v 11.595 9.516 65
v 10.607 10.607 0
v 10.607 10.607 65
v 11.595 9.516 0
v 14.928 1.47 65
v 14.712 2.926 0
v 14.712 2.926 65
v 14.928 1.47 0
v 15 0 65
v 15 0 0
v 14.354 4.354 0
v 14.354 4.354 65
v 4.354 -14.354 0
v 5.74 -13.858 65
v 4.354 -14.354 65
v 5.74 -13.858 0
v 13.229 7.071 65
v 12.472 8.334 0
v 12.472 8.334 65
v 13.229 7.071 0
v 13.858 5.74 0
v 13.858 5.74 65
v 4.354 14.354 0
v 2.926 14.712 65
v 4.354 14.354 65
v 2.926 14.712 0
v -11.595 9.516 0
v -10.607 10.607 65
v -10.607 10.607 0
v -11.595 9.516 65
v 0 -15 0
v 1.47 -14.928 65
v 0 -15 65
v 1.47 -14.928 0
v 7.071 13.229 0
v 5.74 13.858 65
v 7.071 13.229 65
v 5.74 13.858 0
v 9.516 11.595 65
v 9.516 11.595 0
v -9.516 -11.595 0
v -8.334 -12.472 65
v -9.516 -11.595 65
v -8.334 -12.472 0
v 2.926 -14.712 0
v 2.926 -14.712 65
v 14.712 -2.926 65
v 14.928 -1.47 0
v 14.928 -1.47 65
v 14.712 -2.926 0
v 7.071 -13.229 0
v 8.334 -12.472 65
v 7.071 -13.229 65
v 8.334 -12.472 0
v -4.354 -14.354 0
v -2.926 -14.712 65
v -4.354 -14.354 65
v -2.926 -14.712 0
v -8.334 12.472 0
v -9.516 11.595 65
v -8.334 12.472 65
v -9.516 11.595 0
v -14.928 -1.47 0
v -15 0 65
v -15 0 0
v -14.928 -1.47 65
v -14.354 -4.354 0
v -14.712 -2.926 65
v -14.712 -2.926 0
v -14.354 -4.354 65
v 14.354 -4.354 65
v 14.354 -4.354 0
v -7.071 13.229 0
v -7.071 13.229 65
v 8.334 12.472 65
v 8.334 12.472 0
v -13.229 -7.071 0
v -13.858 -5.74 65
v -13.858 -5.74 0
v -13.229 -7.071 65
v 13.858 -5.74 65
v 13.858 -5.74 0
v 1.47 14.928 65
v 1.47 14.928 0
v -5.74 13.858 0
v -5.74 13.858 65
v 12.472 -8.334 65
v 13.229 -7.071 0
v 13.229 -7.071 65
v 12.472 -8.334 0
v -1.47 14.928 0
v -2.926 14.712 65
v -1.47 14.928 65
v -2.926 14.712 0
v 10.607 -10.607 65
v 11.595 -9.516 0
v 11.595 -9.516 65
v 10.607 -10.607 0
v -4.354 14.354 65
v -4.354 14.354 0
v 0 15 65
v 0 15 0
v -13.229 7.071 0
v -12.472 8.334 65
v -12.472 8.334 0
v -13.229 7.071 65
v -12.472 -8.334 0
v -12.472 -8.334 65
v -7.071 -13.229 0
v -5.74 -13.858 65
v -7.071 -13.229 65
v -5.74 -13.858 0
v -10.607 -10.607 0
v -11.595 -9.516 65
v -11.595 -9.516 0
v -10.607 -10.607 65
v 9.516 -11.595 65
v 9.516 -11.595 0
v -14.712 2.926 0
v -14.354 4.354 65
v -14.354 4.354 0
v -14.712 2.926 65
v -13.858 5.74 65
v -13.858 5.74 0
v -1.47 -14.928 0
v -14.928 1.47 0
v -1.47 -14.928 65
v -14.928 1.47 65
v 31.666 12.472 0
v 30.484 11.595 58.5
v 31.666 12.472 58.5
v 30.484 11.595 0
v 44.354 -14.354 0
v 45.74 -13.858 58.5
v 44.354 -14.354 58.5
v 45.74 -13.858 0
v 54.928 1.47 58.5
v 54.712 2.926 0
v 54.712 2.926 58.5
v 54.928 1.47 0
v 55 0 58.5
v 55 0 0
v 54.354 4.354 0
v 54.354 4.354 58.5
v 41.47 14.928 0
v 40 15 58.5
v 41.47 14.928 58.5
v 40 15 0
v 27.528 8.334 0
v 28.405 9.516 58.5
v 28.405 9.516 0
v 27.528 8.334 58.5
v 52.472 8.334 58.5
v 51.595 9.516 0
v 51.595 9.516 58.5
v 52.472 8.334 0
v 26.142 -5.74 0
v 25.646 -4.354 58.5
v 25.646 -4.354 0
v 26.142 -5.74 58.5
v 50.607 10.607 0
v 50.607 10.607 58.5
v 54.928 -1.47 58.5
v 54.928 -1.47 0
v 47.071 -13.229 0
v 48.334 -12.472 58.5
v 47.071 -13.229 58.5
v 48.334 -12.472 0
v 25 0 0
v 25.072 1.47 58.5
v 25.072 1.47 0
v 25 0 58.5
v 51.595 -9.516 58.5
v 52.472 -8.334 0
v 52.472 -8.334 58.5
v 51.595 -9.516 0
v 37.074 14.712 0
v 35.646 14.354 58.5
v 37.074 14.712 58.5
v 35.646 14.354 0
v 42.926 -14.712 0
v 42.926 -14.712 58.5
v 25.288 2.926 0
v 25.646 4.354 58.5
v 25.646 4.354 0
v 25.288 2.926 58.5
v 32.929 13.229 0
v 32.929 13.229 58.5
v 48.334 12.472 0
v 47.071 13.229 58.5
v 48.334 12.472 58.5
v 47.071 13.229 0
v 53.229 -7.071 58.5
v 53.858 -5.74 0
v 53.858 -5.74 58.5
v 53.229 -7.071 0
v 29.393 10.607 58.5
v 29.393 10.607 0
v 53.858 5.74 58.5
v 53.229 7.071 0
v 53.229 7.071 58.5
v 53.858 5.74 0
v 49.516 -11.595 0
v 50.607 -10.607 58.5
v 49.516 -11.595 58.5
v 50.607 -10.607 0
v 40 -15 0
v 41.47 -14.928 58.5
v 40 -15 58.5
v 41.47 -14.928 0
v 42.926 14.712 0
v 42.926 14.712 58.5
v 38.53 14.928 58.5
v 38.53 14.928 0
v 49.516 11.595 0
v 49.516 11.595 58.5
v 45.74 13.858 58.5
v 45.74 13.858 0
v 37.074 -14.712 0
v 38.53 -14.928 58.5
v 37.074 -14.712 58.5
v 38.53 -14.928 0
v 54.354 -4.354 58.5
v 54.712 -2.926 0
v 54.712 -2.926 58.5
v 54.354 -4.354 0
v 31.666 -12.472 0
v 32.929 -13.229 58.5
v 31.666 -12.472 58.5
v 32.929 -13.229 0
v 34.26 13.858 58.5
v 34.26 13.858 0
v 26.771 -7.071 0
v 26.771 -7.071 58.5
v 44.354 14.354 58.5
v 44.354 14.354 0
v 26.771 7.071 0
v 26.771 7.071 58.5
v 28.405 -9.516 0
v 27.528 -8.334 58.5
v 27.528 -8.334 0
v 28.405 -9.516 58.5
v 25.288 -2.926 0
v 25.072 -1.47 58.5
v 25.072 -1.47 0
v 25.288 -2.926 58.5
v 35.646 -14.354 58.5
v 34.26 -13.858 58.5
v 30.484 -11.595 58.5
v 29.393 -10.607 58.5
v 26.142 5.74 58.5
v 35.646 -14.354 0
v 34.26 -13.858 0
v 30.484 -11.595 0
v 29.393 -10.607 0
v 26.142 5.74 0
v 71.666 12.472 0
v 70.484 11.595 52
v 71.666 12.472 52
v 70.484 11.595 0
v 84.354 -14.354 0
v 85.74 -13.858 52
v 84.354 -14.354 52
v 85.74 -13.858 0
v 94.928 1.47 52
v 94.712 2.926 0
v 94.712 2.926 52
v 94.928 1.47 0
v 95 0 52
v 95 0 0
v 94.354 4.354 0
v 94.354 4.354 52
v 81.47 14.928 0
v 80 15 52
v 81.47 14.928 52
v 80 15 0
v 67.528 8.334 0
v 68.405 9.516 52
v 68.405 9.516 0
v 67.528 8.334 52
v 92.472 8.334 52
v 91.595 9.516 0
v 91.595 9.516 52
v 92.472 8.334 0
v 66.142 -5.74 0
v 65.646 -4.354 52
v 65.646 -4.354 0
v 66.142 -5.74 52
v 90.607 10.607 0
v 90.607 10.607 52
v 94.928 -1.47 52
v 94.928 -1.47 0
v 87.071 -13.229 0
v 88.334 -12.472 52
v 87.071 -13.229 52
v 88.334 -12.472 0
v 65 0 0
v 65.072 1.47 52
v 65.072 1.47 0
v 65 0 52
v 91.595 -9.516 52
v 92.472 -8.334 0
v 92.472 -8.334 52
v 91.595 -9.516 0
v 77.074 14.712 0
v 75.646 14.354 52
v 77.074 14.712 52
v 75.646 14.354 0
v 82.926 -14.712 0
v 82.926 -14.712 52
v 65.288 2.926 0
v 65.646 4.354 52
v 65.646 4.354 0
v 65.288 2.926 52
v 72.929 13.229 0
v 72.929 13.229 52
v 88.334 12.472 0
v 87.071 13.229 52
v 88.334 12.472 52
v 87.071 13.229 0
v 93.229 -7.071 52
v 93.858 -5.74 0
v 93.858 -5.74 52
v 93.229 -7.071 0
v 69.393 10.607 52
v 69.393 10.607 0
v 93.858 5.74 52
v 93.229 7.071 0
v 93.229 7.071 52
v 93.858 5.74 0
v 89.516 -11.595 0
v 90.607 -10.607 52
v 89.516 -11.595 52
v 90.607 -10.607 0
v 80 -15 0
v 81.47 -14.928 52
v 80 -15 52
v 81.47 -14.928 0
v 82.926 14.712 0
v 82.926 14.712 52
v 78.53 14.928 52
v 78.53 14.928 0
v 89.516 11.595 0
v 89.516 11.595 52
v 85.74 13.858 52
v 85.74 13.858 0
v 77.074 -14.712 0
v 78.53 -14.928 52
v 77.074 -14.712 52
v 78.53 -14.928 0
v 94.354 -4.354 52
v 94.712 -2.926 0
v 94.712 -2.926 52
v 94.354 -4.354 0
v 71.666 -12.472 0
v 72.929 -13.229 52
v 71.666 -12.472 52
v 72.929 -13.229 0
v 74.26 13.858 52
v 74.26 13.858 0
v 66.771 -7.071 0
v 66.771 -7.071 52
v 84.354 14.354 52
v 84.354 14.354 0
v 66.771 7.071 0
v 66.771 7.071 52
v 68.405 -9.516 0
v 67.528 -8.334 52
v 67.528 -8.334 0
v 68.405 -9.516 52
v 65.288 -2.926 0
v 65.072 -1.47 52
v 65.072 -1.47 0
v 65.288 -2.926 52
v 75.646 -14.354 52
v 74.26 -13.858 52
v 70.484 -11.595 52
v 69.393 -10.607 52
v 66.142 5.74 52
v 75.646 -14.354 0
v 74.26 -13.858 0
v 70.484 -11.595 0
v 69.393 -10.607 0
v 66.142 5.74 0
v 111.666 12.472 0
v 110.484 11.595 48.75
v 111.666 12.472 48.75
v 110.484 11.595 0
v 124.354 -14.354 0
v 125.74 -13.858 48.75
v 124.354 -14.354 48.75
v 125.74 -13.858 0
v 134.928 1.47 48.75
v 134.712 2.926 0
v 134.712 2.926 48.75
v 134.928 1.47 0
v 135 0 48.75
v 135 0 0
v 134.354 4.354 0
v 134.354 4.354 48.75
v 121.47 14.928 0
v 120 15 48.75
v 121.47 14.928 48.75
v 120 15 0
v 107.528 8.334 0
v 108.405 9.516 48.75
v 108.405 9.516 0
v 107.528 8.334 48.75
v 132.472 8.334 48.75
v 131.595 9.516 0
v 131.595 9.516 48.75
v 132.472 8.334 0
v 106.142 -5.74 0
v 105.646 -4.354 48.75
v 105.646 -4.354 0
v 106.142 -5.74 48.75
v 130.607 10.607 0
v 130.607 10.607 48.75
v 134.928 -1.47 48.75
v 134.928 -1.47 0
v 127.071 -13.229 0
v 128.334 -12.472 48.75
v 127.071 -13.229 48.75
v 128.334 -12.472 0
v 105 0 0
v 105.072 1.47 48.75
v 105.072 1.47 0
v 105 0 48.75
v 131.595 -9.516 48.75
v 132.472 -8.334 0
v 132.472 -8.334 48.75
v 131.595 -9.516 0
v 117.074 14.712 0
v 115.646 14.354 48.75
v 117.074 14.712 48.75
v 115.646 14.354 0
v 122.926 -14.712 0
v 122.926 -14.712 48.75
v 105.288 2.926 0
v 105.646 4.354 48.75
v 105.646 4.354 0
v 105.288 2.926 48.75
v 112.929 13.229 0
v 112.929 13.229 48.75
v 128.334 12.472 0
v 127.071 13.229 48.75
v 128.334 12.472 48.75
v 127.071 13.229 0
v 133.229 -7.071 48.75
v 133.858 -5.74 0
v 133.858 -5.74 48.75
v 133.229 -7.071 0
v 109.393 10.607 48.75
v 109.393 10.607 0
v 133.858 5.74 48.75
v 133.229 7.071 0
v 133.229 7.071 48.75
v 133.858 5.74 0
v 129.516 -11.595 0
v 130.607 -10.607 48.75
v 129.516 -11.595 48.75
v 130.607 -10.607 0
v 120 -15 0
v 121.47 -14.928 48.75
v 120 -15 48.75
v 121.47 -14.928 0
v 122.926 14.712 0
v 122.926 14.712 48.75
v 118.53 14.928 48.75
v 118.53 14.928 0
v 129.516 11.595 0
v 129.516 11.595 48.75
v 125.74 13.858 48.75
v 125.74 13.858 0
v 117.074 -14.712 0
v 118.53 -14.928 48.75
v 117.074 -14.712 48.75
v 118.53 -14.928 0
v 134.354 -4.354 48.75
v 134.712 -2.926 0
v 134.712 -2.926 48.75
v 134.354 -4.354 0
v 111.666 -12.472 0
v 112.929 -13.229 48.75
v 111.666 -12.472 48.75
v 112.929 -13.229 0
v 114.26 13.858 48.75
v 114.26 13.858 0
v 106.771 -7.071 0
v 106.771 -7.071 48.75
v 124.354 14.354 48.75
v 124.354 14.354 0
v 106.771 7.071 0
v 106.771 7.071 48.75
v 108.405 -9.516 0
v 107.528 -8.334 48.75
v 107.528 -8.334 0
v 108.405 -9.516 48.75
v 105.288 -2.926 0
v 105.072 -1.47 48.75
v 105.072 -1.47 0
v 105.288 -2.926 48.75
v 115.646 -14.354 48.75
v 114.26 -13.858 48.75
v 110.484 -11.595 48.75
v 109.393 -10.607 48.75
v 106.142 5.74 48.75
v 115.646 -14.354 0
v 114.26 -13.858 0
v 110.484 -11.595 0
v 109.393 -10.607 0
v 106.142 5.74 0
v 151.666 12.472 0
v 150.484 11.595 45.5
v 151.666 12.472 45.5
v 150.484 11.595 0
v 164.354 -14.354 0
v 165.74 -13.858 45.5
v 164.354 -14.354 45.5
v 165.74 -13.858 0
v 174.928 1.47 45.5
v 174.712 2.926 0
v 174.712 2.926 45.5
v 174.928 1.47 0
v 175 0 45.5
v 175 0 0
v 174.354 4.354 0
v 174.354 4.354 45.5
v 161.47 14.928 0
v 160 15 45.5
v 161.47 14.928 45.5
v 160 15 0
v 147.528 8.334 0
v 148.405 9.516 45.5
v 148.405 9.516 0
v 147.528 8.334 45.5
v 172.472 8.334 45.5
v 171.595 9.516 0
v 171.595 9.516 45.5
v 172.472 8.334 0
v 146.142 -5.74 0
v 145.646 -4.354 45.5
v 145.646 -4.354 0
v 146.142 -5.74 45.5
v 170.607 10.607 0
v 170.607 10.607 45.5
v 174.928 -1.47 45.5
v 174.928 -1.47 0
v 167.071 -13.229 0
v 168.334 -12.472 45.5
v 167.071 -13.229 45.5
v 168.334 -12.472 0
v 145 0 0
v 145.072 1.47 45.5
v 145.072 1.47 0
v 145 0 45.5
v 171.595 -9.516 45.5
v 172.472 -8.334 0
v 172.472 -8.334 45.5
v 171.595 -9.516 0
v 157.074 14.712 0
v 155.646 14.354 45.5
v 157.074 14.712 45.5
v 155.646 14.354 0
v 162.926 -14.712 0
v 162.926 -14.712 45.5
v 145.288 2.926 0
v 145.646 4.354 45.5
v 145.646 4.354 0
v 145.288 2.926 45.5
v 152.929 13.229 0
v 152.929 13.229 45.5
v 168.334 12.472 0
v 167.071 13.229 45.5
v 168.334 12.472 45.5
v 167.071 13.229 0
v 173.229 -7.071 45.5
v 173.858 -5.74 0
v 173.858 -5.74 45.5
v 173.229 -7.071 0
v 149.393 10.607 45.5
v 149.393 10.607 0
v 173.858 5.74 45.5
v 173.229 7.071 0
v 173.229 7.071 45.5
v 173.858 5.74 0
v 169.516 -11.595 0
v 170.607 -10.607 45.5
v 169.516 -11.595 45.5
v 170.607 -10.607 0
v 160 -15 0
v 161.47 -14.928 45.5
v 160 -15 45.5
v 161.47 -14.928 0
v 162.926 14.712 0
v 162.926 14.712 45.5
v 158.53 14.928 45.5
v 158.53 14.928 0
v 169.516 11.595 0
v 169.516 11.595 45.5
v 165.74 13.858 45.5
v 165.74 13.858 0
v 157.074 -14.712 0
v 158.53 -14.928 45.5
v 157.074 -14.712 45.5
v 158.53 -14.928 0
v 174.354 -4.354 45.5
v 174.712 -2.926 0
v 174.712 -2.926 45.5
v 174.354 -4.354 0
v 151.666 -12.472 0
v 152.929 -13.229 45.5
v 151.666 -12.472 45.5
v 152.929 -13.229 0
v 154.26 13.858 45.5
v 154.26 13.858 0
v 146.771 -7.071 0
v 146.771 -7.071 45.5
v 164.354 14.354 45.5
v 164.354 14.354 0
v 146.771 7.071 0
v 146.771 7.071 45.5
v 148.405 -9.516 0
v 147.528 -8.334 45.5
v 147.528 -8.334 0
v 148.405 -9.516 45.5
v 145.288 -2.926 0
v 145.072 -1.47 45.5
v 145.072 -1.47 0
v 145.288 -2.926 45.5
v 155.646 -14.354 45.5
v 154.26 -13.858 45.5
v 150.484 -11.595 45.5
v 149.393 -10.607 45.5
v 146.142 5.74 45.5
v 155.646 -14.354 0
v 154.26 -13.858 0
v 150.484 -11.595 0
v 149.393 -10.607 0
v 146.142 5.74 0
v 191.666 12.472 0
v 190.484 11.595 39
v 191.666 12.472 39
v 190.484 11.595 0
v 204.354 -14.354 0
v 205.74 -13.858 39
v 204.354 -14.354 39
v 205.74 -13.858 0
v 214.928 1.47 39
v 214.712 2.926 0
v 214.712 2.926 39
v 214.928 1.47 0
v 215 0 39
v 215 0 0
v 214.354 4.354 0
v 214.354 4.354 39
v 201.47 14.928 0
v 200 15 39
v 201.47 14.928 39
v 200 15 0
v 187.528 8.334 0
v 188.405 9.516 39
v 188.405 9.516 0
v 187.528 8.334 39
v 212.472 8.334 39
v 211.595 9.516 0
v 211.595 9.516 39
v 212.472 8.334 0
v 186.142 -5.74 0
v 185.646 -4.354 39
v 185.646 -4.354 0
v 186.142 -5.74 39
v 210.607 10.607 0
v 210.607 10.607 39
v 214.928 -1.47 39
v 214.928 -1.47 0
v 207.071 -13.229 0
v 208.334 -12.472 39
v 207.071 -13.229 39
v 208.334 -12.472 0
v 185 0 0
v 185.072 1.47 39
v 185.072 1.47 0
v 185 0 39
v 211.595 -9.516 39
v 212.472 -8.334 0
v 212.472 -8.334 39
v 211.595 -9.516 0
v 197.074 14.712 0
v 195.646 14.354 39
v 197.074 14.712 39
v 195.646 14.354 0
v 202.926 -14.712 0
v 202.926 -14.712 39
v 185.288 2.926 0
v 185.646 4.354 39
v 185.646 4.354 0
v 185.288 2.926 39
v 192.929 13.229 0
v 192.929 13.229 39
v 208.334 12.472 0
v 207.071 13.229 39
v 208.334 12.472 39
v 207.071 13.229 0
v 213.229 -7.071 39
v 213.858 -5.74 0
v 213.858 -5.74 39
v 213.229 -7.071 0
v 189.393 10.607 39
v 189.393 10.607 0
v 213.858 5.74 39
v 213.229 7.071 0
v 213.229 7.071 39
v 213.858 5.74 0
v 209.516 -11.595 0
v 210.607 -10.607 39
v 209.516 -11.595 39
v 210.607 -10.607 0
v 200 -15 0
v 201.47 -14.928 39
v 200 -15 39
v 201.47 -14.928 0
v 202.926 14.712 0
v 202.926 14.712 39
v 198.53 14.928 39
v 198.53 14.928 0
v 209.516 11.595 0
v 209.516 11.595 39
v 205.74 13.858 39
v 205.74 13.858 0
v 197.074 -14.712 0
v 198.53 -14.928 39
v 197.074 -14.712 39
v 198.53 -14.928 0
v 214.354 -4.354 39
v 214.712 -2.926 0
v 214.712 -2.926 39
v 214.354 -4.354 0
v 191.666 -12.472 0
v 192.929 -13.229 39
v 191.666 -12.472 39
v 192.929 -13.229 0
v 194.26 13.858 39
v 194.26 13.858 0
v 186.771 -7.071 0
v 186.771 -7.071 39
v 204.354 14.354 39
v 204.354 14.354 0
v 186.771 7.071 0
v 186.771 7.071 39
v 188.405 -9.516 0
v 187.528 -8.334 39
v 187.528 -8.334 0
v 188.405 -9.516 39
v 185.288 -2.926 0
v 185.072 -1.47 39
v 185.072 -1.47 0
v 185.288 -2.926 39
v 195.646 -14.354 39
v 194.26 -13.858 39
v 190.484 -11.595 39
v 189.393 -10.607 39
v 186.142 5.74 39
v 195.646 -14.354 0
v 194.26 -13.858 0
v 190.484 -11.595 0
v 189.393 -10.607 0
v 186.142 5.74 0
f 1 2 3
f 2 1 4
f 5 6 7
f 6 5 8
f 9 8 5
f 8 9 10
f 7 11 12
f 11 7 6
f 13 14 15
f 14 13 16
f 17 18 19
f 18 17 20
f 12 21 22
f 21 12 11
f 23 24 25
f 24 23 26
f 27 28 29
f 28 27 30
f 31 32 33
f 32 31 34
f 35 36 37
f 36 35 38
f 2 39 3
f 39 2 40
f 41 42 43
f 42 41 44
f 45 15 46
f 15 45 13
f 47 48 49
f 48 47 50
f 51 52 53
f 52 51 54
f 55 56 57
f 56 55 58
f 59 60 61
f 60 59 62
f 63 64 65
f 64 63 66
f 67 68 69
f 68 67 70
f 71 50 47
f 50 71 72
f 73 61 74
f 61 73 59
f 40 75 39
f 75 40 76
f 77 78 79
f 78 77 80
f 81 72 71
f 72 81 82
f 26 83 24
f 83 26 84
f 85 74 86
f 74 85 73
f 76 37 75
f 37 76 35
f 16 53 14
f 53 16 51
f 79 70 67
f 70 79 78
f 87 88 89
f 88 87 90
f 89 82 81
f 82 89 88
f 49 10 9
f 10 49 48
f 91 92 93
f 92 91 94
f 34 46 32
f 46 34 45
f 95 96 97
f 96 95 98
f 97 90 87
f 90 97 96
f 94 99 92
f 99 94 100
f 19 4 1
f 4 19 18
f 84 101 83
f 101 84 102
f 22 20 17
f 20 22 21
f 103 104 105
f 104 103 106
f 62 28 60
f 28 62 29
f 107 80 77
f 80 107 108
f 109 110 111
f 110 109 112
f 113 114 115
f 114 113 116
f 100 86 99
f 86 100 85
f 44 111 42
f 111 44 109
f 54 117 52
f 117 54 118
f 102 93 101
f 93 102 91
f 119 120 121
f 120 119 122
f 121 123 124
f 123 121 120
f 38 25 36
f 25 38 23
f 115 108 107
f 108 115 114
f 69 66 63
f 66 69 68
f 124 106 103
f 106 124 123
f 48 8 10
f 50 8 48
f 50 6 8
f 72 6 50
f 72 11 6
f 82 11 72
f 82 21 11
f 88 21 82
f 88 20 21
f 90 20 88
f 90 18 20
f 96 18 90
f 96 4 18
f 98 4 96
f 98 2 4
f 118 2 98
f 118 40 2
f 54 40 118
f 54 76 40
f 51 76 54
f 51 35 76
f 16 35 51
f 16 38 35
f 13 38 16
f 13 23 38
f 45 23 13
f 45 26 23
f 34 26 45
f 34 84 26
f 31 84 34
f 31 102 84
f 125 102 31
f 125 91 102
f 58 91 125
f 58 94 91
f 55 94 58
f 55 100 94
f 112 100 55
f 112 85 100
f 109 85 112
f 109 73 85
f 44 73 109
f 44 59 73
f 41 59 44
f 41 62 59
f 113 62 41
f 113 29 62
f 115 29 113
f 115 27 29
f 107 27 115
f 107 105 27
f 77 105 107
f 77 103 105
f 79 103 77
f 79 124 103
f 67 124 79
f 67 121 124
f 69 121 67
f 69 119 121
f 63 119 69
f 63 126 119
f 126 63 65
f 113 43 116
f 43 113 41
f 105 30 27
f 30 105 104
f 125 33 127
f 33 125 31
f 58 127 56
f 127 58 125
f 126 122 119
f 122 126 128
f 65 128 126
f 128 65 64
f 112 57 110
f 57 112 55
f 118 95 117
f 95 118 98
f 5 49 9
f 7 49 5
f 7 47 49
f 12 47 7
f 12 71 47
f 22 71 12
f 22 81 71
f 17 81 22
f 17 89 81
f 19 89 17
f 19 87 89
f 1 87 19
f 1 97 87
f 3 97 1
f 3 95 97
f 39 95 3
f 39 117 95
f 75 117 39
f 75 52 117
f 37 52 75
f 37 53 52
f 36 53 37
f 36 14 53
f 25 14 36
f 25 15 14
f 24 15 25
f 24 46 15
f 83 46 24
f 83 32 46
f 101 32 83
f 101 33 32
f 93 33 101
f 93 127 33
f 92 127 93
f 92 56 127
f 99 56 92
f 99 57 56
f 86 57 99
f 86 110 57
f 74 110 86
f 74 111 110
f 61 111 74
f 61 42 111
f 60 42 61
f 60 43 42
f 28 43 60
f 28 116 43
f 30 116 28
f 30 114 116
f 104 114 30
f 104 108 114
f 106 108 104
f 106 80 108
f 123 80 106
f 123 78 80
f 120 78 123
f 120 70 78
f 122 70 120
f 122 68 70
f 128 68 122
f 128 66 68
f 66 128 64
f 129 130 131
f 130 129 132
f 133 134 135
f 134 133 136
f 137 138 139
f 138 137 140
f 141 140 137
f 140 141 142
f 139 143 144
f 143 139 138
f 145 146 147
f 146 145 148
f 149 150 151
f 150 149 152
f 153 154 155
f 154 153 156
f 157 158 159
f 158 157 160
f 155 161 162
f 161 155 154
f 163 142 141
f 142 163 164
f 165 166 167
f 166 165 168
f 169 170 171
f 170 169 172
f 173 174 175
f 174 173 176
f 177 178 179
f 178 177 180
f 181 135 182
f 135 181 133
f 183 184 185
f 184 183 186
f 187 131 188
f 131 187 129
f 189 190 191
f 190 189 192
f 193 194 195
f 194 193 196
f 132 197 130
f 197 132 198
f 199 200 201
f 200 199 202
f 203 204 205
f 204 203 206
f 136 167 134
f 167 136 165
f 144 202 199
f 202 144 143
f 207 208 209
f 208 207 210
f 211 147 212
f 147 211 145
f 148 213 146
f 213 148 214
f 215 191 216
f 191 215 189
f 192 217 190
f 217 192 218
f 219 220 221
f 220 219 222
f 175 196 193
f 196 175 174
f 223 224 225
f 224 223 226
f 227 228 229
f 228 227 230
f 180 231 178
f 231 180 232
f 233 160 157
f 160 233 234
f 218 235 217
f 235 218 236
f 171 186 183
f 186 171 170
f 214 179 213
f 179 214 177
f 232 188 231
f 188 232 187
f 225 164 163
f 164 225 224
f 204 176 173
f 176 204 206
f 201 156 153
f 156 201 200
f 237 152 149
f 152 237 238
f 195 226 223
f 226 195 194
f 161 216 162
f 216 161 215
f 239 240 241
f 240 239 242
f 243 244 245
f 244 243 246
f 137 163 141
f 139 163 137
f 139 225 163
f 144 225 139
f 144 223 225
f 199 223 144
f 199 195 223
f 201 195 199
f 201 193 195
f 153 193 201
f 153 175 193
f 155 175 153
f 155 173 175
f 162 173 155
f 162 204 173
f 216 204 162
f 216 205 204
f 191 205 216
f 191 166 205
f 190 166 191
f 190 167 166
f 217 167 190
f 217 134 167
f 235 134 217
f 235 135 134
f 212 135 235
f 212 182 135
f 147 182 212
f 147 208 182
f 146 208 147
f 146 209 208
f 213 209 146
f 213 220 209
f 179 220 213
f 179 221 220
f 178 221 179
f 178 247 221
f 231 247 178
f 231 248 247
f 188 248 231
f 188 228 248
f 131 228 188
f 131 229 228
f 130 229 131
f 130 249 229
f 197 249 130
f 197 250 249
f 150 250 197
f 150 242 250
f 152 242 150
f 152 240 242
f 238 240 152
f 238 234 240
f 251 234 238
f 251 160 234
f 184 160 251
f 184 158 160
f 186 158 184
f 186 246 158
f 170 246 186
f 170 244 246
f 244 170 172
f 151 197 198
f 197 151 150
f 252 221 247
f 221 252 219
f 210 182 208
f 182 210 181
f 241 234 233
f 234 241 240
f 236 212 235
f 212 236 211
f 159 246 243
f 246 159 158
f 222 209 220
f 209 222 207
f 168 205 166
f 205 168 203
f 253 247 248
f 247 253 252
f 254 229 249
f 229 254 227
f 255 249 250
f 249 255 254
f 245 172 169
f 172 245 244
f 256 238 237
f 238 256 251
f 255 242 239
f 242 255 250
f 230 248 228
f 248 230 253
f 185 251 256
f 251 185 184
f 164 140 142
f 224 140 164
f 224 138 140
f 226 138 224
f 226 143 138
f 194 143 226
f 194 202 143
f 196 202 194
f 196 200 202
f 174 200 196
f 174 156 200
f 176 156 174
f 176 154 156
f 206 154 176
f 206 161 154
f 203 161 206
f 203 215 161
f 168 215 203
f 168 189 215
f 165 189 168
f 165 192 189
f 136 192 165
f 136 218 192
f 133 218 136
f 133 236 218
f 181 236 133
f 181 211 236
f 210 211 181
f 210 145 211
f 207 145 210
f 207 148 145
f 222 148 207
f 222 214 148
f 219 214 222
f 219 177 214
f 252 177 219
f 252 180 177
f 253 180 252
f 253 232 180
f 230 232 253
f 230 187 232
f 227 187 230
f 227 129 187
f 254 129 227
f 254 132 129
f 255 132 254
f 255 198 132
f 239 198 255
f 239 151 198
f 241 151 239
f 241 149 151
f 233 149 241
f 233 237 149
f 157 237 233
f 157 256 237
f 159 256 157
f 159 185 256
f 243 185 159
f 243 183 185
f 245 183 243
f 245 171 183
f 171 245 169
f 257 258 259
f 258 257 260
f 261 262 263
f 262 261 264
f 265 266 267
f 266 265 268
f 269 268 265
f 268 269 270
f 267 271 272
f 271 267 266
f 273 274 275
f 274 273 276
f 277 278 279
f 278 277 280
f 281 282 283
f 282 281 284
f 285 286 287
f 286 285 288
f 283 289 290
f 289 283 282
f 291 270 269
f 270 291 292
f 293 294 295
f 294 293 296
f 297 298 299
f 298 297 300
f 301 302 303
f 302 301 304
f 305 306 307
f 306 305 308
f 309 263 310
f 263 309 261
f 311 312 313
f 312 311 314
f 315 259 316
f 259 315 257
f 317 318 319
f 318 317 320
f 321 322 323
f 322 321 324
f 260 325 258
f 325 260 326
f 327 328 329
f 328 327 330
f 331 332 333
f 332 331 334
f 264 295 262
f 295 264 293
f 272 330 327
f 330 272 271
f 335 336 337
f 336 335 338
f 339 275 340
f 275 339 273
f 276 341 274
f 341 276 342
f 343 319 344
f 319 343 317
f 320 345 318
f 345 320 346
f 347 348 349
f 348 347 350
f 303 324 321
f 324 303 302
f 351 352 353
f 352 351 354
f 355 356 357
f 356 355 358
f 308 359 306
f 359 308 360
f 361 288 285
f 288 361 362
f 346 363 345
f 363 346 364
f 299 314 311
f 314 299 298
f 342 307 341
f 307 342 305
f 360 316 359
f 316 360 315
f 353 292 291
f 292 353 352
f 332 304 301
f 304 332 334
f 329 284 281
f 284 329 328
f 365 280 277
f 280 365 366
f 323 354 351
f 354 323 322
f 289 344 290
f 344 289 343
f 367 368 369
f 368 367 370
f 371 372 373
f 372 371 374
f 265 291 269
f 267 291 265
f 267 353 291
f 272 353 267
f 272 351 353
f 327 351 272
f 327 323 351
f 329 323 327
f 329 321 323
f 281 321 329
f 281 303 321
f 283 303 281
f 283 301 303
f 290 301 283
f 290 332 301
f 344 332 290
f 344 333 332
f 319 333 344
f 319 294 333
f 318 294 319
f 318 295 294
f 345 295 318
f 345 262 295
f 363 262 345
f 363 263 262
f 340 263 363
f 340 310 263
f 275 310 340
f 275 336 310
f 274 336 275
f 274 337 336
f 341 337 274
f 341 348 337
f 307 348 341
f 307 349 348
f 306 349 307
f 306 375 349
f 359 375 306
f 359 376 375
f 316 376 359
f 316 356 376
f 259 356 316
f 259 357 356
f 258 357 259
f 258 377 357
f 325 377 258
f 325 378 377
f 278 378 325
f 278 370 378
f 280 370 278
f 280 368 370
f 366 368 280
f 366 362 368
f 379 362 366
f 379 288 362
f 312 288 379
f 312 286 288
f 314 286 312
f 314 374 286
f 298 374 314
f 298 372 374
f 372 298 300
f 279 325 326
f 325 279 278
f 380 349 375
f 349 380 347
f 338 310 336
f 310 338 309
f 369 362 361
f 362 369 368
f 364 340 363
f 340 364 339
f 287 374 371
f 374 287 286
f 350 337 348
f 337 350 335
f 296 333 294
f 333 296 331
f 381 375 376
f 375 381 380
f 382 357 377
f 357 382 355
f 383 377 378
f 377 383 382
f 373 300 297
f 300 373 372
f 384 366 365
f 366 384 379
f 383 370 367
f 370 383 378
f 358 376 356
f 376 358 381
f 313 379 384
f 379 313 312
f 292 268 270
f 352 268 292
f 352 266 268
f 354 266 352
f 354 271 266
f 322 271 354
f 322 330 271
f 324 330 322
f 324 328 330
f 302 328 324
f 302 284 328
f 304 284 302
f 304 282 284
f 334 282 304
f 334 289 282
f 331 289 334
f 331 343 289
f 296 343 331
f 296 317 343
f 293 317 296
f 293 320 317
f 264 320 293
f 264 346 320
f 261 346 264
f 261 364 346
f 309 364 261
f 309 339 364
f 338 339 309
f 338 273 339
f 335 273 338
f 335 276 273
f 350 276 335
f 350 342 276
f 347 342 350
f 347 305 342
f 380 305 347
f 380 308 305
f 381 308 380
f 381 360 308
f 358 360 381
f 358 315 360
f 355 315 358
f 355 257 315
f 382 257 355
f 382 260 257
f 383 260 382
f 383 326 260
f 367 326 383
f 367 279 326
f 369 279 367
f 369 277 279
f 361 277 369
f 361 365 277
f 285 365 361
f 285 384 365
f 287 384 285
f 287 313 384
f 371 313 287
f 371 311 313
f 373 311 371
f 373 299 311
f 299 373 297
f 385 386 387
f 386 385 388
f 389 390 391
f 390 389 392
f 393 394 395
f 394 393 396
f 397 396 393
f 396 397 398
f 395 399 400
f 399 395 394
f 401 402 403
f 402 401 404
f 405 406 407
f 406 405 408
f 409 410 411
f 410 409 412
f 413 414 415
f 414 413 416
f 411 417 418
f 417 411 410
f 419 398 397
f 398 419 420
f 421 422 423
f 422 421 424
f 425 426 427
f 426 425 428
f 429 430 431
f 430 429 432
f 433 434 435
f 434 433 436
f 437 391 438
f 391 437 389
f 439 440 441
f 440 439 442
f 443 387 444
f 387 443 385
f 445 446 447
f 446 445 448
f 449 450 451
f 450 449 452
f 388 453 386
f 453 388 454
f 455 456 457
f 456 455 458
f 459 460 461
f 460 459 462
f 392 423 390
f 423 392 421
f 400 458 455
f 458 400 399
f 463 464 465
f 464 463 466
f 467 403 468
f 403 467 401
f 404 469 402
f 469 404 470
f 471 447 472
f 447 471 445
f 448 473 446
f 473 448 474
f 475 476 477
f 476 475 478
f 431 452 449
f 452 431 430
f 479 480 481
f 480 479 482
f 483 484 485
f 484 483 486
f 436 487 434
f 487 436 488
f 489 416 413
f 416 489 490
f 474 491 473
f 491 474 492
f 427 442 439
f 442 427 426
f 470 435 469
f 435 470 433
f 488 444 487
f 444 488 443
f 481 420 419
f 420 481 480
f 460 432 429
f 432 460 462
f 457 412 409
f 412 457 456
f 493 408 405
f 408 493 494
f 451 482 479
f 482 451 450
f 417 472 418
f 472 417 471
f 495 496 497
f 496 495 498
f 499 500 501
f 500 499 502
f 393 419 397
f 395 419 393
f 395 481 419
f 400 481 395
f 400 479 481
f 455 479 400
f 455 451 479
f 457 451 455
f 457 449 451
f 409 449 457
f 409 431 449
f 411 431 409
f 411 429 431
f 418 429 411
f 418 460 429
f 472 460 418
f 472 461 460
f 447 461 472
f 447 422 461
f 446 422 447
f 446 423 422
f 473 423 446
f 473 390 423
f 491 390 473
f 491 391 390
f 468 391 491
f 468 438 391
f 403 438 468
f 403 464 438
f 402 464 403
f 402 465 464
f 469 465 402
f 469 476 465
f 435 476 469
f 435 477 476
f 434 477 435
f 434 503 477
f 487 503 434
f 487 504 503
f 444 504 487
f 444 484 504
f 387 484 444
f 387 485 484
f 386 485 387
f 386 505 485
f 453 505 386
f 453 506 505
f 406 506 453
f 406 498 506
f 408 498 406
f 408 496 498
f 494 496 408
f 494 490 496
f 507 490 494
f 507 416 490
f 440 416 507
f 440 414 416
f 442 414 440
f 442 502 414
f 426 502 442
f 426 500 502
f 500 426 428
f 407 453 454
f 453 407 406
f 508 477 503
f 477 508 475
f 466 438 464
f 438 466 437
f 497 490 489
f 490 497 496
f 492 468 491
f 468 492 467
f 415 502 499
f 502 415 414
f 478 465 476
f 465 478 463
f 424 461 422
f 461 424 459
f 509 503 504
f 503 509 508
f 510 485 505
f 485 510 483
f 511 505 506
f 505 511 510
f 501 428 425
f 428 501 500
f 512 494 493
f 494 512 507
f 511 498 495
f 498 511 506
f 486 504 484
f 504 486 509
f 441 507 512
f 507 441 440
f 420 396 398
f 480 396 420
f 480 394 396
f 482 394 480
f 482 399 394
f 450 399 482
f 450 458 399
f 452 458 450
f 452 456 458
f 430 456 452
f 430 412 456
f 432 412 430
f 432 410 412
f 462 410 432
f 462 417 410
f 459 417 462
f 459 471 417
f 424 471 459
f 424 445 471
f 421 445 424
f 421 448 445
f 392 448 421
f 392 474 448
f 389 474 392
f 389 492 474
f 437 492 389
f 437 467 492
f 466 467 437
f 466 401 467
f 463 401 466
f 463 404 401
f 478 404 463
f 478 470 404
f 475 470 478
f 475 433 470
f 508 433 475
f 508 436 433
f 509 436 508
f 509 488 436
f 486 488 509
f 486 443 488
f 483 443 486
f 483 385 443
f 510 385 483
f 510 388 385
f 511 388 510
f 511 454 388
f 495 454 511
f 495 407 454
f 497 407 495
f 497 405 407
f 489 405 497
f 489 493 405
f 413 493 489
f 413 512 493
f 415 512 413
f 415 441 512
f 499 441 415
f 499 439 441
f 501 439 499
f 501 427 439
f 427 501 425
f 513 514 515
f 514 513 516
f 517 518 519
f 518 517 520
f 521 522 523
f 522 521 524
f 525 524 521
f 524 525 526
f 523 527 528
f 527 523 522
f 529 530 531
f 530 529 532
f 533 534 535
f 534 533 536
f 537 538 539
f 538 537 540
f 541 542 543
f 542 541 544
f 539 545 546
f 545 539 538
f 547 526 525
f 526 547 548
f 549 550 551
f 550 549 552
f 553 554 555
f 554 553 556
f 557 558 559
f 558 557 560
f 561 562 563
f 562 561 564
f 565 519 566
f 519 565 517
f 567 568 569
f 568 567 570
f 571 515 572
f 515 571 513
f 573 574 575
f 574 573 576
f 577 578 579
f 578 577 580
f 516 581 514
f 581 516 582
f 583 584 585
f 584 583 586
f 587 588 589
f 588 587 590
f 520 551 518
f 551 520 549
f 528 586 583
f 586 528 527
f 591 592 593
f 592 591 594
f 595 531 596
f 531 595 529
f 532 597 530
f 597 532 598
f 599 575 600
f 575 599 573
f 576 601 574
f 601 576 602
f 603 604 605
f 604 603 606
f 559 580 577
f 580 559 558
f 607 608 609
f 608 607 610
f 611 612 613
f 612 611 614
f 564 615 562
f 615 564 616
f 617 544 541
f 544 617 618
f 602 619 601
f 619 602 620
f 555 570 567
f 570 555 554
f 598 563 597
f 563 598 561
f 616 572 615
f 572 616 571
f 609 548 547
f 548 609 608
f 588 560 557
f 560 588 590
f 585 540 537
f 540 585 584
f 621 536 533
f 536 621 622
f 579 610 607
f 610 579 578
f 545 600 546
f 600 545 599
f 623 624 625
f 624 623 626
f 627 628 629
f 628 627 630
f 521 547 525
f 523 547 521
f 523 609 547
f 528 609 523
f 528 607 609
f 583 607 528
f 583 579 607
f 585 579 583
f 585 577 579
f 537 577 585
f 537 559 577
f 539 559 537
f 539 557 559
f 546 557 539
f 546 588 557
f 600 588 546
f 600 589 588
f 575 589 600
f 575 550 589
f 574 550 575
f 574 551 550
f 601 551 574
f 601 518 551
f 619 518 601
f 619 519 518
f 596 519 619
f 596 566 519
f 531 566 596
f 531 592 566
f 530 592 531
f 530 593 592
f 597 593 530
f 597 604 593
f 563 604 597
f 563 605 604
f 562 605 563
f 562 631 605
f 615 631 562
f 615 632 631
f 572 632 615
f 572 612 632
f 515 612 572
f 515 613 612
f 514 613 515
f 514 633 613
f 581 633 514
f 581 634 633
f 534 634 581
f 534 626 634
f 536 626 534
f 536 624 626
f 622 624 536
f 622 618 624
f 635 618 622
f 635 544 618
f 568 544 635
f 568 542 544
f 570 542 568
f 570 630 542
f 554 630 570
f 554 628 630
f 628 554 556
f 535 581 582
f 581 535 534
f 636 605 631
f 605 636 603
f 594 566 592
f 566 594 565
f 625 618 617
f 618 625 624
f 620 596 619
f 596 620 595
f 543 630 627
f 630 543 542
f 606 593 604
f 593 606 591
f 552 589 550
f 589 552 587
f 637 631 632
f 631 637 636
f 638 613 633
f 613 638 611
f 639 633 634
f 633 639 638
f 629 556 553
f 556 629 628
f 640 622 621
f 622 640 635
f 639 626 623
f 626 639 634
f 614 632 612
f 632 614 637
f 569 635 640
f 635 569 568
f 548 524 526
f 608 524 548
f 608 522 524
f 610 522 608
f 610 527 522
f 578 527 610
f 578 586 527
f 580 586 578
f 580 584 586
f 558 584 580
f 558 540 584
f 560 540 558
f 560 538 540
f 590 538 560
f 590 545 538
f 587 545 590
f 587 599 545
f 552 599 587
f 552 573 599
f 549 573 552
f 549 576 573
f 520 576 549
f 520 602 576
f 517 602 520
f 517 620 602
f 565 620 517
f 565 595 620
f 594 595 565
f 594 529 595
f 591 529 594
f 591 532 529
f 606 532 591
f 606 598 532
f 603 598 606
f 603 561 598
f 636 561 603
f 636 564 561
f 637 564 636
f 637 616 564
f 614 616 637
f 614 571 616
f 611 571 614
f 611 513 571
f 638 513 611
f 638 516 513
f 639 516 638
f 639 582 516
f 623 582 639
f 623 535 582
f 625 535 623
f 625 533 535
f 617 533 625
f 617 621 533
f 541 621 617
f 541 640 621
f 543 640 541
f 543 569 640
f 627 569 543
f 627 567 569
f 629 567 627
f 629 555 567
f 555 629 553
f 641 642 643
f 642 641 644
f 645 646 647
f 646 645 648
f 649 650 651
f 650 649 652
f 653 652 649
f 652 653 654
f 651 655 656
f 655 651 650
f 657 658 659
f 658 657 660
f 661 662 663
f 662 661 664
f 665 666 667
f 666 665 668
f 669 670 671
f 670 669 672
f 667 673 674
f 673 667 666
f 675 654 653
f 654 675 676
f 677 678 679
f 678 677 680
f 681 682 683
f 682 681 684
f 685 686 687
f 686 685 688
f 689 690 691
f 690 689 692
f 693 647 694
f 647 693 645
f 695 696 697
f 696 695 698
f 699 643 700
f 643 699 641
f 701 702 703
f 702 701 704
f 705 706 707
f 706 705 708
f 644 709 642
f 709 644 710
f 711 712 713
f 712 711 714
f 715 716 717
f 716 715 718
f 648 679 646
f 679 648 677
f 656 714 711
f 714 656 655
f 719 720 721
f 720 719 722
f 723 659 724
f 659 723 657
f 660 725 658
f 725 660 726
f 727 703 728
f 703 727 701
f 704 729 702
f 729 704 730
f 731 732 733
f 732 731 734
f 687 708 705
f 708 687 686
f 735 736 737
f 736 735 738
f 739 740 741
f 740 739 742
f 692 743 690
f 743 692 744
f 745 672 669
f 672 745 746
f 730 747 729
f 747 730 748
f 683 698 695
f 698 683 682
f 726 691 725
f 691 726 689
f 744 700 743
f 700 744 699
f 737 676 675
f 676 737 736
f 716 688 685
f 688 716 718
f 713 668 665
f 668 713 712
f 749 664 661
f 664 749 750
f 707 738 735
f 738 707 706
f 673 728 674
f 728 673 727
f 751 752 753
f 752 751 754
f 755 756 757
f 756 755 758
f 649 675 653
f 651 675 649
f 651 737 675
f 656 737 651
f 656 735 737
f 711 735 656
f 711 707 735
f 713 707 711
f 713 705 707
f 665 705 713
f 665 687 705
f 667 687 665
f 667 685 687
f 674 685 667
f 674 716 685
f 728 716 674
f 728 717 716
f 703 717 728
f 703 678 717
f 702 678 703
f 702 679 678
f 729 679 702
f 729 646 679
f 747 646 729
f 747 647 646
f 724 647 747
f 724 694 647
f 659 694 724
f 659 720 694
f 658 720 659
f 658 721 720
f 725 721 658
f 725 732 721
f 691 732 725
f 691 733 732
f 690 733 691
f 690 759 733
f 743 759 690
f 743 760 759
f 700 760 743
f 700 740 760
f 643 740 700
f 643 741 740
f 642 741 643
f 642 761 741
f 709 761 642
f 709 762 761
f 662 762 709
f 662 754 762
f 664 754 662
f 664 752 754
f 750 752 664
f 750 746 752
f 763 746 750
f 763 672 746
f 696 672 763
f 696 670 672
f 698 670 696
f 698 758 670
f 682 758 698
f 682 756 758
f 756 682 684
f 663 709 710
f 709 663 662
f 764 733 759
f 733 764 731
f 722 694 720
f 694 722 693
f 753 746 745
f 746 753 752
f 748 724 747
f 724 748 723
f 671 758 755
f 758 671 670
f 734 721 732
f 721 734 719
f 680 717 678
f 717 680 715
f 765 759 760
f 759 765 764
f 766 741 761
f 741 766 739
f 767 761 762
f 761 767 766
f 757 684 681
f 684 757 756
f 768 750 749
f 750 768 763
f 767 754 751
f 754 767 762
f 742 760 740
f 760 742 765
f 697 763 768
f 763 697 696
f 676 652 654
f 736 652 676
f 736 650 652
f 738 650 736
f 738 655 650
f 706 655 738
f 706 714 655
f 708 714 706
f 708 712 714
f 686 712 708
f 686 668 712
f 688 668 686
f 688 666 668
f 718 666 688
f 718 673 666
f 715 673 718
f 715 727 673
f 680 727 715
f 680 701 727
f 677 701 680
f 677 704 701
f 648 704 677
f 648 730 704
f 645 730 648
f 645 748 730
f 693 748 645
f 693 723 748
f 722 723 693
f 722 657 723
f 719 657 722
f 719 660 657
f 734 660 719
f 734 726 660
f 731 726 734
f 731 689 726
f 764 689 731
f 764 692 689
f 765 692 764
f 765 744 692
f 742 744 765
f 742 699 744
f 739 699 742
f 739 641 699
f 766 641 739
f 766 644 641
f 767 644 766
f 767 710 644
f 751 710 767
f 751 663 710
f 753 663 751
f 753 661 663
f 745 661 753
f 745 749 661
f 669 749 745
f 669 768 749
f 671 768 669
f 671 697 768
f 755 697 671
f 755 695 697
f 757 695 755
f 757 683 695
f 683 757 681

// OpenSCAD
// Versus Chess — Layer 1: Parametric Sizing Rig
//
// Forking for your own table? Change table_square_mm and base_diameter_mm
// below (see docs/PROJECT-SPEC.md for the 40-45% clearance rule these come
// from) and every role blank re-derives automatically. Nothing below the
// parameters block should need to change for a different table.

table_square_mm  = 70;   // this table's measured square width
base_diameter_mm = 30;   // uniform across all roles — see docs/PROJECT-SPEC.md
king_height_mm   = 65;   // the one number every other height derives from

// Staunton-convention height ratios (docs/PROJECT-SPEC.md, "Piece Height Hierarchy")
role_ratios = [
  ["king",   1.00],
  ["queen",  0.90],
  ["bishop", 0.80],
  ["knight", 0.75],
  ["rook",   0.70],
  ["pawn",   0.60],
];

function role_height(ratio) = king_height_mm * ratio;

// ---------------------------------------------------------------------
// TODO(you): role_blank(height, base_diameter) — the silhouette profile.
//
// This is the one real design decision left in Layer 1: what shape does
// a "blank" actually take before a character skin gets conformed onto it?
// The spec calls for "a simple bounding form (capsule/cone)" but doesn't
// pick one — that's deliberately left for you.
//
// Trade-offs to weigh:
//   - Straight cone (base -> narrower top): simplest, prints with zero
//     overhangs, but the least characterful silhouette to sculpt onto.
//   - Capsule (cylinder + hemisphere cap): more universally Staunton-like,
//     rounded top reads as a "head" mount point for character conforming.
//   - Waisted/stepped profile (narrower mid-section, flared base+shoulder):
//     most convention-accurate Staunton look, but check overhang angles —
//     anything steeper than ~45 deg from vertical will droop without
//     supports at 0.2mm layer height.
//
// Whatever you pick, keep the base at full base_diameter (that's the
// board-collision guarantee) and the overall height exactly `height` —
// those two numbers are load-bearing for every other file in this repo.
//
// Signature to implement:
module role_blank(height, base_diameter) {
  // Replace this placeholder with your actual profile.
  cylinder(h=height, d1=base_diameter, d2=base_diameter, $fn=64);
}
// ---------------------------------------------------------------------

// Demo: lay out all six roles left-to-right for a quick render/preview.
spacing = base_diameter_mm + 10;
for (i = [0 : len(role_ratios)-1]) {
  role = role_ratios[i];
  translate([i * spacing, 0, 0])
    role_blank(role_height(role[1]), base_diameter_mm);
}
